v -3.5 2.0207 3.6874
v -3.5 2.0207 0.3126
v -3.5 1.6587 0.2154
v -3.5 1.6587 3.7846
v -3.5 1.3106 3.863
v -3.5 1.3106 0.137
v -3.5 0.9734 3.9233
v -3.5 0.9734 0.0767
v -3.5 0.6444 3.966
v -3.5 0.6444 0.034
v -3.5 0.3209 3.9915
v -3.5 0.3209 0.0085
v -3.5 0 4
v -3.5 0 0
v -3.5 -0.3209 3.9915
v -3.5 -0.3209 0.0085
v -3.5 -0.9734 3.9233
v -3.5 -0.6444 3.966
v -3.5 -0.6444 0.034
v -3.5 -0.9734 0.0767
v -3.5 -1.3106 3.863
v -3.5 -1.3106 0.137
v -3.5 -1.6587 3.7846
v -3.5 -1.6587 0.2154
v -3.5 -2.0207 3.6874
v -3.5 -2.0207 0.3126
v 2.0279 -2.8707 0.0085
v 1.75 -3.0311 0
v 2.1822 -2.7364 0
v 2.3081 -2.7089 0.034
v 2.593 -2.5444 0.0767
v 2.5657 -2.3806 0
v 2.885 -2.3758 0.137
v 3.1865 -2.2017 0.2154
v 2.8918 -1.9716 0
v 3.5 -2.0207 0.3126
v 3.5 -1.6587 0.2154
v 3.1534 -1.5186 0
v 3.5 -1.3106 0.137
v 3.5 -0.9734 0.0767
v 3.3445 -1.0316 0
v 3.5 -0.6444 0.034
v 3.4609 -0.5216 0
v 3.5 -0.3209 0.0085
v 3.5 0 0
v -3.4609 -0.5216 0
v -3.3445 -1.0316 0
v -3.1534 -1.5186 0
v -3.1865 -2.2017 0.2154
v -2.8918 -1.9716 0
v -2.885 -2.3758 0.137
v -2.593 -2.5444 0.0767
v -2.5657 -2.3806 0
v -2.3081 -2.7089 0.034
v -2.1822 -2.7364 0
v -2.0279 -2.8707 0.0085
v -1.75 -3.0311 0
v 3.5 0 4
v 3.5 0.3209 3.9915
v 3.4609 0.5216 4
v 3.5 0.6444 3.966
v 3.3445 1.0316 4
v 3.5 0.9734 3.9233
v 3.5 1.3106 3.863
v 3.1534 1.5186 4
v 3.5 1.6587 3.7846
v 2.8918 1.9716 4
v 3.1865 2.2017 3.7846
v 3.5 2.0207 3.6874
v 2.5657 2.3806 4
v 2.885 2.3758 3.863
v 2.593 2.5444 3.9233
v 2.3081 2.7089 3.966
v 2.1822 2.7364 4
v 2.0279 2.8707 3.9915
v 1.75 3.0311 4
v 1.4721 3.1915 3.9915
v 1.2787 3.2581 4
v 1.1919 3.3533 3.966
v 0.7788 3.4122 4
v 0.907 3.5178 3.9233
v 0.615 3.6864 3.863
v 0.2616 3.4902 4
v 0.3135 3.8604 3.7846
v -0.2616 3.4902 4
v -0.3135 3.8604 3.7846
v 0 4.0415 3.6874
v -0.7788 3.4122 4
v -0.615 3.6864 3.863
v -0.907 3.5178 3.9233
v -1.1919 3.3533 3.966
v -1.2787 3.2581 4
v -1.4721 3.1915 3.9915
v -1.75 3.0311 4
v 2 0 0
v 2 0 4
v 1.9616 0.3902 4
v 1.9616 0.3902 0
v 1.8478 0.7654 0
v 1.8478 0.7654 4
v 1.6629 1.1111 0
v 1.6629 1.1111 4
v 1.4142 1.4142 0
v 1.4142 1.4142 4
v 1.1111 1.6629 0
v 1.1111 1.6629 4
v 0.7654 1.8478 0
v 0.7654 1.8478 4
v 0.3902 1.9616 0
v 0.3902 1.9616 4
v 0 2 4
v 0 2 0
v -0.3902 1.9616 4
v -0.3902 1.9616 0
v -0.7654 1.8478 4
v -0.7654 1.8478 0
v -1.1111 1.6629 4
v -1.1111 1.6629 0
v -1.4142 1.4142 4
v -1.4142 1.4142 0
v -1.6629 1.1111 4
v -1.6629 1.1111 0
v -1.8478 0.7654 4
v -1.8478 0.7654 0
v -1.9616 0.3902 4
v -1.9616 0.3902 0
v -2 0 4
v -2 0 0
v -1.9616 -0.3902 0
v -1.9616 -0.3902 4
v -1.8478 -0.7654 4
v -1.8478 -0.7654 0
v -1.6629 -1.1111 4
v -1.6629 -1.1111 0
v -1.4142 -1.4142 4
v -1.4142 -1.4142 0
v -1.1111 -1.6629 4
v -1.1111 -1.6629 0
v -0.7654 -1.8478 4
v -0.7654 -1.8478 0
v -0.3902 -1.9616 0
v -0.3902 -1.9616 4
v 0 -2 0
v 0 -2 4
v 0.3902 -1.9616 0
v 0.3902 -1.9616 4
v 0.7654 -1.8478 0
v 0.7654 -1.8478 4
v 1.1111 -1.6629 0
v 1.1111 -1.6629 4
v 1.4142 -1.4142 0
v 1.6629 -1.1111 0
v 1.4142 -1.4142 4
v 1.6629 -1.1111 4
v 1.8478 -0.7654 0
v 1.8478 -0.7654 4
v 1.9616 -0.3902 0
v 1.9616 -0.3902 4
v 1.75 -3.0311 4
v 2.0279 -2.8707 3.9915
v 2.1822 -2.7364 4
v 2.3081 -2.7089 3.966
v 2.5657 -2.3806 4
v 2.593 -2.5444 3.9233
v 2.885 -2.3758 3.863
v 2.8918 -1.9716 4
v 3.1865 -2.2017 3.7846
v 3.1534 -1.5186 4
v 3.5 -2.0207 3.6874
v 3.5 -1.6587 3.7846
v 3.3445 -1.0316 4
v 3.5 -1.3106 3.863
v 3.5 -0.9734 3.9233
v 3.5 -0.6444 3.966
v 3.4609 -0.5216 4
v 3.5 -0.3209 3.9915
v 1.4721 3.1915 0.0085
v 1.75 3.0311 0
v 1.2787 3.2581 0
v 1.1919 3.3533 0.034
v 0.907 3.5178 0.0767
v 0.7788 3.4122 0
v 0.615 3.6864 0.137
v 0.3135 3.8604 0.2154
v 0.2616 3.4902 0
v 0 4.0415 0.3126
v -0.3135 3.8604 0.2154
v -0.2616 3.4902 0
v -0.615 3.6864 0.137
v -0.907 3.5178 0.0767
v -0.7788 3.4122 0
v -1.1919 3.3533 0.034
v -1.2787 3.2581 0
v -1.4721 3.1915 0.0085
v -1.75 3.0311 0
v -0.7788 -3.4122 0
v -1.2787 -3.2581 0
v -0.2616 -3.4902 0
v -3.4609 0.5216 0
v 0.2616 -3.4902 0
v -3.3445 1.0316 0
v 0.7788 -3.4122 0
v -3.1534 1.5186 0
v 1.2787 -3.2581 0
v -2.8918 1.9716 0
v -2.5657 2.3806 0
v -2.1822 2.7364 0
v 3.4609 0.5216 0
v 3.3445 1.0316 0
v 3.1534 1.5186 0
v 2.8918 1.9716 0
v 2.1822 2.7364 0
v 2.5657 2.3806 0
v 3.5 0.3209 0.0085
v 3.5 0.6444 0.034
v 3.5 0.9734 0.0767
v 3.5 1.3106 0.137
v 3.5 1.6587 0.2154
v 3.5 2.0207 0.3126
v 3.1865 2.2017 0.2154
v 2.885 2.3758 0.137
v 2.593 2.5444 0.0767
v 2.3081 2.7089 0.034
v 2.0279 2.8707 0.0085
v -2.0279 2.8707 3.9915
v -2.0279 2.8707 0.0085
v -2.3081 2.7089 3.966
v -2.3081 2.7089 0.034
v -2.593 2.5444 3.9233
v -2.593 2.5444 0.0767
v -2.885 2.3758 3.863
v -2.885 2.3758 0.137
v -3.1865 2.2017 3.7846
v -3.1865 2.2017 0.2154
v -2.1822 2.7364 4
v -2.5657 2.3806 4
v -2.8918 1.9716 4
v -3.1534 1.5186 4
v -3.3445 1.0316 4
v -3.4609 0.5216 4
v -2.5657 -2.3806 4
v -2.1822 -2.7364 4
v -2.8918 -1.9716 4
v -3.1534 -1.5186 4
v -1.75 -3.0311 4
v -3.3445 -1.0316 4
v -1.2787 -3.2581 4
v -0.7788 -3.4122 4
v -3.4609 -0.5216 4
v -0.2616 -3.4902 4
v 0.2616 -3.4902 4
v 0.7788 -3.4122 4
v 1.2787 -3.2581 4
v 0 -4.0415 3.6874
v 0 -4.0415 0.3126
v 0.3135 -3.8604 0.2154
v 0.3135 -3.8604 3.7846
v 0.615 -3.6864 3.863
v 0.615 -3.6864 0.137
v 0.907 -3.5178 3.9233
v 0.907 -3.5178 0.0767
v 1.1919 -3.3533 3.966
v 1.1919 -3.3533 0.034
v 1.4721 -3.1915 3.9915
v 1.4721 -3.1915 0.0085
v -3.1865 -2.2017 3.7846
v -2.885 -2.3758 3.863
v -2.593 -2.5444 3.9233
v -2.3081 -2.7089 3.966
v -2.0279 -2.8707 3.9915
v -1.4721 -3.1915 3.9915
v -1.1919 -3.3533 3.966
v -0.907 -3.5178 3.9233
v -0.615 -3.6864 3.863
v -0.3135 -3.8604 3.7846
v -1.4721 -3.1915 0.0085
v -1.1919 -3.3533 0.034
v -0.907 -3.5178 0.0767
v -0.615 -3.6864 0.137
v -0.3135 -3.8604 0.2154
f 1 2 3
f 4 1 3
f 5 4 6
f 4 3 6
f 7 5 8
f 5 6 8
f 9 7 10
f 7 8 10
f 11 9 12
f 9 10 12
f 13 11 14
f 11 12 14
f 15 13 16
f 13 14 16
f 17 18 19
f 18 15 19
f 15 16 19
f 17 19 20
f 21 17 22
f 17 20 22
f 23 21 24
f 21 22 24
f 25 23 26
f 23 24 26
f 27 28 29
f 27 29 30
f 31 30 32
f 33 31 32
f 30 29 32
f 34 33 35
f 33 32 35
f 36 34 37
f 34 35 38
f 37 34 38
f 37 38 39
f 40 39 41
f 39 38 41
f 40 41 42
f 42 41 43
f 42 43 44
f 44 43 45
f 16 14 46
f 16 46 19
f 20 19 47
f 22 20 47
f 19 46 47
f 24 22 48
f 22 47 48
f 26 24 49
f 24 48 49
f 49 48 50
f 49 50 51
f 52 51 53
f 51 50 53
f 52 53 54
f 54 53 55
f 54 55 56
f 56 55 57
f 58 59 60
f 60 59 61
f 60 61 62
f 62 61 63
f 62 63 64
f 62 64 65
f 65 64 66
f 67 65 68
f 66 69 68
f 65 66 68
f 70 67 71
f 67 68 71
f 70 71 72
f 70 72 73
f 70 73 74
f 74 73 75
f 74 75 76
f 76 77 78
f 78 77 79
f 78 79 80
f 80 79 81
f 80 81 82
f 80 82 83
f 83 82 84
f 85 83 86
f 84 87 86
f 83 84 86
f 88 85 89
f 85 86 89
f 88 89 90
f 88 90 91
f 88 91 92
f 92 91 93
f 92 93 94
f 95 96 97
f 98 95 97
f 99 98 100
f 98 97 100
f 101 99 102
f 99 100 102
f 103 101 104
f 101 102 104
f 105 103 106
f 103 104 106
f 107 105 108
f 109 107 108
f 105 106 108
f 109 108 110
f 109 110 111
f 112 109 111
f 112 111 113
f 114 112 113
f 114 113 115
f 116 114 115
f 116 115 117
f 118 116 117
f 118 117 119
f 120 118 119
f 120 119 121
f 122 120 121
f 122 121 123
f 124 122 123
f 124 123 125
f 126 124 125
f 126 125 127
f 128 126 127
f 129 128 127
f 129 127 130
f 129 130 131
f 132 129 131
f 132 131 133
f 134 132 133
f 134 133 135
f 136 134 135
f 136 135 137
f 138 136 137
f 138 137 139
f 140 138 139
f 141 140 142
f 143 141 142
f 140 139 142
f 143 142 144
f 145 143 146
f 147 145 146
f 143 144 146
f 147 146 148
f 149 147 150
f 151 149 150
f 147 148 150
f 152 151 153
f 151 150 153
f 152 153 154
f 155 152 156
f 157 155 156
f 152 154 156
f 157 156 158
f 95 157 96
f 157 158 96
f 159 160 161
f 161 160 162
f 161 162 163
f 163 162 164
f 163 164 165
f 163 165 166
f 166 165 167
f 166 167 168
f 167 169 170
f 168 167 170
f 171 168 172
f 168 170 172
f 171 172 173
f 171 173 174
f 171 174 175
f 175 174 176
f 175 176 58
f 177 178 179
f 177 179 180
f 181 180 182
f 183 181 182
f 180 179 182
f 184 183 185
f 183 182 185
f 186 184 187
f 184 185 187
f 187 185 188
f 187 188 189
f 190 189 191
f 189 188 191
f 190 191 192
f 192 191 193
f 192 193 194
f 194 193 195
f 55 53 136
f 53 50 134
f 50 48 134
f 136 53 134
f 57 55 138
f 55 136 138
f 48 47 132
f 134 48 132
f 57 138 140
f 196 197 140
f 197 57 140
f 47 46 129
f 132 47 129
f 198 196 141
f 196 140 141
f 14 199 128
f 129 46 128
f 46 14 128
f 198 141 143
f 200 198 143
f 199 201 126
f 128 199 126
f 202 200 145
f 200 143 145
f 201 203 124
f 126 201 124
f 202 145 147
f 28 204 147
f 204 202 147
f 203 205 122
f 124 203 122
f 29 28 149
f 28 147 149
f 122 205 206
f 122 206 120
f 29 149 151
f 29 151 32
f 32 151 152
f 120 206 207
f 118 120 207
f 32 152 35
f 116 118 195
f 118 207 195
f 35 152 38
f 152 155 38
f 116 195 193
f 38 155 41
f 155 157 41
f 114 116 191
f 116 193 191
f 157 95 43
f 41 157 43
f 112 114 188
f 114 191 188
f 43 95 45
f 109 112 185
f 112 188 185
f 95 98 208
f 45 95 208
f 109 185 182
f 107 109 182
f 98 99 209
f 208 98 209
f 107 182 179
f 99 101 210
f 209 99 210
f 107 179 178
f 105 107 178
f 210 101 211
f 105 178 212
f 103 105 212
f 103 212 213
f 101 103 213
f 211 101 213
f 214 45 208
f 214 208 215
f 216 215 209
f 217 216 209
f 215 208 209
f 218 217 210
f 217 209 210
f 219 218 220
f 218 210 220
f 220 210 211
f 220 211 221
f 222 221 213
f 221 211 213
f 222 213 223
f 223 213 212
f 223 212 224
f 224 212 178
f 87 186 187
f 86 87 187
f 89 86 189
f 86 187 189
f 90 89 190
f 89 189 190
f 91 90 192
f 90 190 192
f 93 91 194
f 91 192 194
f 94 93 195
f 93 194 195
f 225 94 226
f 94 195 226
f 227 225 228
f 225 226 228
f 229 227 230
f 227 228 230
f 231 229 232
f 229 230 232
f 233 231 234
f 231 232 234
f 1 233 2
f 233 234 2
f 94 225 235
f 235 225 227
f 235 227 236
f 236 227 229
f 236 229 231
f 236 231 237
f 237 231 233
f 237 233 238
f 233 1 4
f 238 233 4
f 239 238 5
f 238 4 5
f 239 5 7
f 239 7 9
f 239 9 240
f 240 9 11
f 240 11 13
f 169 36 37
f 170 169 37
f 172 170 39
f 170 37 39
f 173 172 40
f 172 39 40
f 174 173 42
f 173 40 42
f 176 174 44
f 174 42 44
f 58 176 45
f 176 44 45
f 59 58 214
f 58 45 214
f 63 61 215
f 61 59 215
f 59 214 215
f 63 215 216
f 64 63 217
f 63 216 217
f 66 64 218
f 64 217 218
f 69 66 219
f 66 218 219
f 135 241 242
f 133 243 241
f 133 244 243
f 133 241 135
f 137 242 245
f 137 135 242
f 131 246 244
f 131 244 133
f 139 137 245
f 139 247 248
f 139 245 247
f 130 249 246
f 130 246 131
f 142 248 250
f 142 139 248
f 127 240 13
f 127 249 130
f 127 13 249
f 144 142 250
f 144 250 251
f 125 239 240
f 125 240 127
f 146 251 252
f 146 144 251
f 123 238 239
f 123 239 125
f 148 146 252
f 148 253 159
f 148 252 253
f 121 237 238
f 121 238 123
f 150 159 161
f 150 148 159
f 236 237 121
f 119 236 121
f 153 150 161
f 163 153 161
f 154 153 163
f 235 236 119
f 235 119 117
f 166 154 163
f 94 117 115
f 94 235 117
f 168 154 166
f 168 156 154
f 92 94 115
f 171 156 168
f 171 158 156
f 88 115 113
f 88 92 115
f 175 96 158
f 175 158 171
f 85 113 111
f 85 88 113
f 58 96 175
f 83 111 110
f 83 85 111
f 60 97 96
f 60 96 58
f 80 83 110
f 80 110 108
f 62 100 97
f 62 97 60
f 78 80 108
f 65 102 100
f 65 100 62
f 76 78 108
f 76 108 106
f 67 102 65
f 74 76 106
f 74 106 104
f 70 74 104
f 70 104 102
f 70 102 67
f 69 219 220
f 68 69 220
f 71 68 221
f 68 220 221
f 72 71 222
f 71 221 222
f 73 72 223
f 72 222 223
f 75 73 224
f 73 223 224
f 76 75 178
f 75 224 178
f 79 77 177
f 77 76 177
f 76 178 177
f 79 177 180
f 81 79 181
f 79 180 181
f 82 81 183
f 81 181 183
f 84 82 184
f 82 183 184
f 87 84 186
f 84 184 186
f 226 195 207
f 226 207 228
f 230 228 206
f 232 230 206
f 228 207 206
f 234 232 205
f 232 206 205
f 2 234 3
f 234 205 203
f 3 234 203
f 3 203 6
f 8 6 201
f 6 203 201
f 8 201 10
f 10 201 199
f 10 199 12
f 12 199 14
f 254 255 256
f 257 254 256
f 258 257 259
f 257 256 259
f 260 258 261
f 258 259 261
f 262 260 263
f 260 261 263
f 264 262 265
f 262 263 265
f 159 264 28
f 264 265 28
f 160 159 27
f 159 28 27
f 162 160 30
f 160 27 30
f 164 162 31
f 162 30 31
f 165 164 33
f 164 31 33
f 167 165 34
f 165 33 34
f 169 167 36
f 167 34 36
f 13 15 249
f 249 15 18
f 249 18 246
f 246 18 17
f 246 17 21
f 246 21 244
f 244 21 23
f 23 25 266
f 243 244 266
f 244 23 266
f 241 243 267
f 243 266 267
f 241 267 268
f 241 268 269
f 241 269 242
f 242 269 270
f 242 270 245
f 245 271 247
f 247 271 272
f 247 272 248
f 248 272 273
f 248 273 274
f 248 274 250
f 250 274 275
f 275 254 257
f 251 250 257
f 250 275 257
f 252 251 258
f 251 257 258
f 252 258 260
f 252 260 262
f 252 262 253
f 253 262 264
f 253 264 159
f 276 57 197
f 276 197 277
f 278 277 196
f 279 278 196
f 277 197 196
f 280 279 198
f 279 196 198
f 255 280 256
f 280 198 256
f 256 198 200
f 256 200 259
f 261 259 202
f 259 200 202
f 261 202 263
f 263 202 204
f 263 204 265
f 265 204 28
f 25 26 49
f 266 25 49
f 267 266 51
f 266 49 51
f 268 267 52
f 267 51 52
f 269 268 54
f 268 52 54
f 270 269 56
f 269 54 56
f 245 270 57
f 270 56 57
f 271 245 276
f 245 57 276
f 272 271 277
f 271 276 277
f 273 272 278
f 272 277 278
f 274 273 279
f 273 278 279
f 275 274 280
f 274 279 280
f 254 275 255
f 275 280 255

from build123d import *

# Parameters (mm, degrees)
BOSS_EXTRU_1_DEPTH      = 4
ENL_V_MAT_EXTRU_1_REACH = 6
ESQUISSE2_R             = 2


with BuildPart() as part:
    # Esquisse1 → Boss.-Extru.1 (new body)
    with BuildSketch(Plane.XY):
        Polygon((0, 4.041451884), (-3.5, 2.020725942), (-3.5, -2.020725942), (0, -4.041451884), (3.5, -2.020725942), (3.5, 2.020725942), align=None)
    extrude(amount=BOSS_EXTRU_1_DEPTH)

    # Esquisse2 → Enlèv. mat.-Extru.1 (cut, up to next)
    with BuildSketch(Plane.XY.offset(4), mode=Mode.PRIVATE) as enl_v_mat_extru_1_sk1:
        Circle(ESQUISSE2_R)
    enl_v_mat_extru_1_tool1 = extrude(enl_v_mat_extru_1_sk1.sketch, amount=-ENL_V_MAT_EXTRU_1_REACH, mode=Mode.PRIVATE) & part.part
    add(enl_v_mat_extru_1_tool1.solids().sort_by_distance((0, 0, 4))[0], mode=Mode.SUBTRACT)

    # Esquisse4 → Enlèvement de matière-Révolution8 (revolve, cut)
    with BuildSketch(Plane(origin=(0, 0, 0), x_dir=(1, 0, 0), z_dir=(0, 1, 0))):
        Polygon((-6.964101615, -2), (-1.767949192, 1), (-7.964101615, 1), (-7.964101615, -5), (-1.767949192, -5), align=None)
    revolve(axis=Axis((0, 0, 0), (0, 0, 1)), mode=Mode.SUBTRACT)


solid = part.part
